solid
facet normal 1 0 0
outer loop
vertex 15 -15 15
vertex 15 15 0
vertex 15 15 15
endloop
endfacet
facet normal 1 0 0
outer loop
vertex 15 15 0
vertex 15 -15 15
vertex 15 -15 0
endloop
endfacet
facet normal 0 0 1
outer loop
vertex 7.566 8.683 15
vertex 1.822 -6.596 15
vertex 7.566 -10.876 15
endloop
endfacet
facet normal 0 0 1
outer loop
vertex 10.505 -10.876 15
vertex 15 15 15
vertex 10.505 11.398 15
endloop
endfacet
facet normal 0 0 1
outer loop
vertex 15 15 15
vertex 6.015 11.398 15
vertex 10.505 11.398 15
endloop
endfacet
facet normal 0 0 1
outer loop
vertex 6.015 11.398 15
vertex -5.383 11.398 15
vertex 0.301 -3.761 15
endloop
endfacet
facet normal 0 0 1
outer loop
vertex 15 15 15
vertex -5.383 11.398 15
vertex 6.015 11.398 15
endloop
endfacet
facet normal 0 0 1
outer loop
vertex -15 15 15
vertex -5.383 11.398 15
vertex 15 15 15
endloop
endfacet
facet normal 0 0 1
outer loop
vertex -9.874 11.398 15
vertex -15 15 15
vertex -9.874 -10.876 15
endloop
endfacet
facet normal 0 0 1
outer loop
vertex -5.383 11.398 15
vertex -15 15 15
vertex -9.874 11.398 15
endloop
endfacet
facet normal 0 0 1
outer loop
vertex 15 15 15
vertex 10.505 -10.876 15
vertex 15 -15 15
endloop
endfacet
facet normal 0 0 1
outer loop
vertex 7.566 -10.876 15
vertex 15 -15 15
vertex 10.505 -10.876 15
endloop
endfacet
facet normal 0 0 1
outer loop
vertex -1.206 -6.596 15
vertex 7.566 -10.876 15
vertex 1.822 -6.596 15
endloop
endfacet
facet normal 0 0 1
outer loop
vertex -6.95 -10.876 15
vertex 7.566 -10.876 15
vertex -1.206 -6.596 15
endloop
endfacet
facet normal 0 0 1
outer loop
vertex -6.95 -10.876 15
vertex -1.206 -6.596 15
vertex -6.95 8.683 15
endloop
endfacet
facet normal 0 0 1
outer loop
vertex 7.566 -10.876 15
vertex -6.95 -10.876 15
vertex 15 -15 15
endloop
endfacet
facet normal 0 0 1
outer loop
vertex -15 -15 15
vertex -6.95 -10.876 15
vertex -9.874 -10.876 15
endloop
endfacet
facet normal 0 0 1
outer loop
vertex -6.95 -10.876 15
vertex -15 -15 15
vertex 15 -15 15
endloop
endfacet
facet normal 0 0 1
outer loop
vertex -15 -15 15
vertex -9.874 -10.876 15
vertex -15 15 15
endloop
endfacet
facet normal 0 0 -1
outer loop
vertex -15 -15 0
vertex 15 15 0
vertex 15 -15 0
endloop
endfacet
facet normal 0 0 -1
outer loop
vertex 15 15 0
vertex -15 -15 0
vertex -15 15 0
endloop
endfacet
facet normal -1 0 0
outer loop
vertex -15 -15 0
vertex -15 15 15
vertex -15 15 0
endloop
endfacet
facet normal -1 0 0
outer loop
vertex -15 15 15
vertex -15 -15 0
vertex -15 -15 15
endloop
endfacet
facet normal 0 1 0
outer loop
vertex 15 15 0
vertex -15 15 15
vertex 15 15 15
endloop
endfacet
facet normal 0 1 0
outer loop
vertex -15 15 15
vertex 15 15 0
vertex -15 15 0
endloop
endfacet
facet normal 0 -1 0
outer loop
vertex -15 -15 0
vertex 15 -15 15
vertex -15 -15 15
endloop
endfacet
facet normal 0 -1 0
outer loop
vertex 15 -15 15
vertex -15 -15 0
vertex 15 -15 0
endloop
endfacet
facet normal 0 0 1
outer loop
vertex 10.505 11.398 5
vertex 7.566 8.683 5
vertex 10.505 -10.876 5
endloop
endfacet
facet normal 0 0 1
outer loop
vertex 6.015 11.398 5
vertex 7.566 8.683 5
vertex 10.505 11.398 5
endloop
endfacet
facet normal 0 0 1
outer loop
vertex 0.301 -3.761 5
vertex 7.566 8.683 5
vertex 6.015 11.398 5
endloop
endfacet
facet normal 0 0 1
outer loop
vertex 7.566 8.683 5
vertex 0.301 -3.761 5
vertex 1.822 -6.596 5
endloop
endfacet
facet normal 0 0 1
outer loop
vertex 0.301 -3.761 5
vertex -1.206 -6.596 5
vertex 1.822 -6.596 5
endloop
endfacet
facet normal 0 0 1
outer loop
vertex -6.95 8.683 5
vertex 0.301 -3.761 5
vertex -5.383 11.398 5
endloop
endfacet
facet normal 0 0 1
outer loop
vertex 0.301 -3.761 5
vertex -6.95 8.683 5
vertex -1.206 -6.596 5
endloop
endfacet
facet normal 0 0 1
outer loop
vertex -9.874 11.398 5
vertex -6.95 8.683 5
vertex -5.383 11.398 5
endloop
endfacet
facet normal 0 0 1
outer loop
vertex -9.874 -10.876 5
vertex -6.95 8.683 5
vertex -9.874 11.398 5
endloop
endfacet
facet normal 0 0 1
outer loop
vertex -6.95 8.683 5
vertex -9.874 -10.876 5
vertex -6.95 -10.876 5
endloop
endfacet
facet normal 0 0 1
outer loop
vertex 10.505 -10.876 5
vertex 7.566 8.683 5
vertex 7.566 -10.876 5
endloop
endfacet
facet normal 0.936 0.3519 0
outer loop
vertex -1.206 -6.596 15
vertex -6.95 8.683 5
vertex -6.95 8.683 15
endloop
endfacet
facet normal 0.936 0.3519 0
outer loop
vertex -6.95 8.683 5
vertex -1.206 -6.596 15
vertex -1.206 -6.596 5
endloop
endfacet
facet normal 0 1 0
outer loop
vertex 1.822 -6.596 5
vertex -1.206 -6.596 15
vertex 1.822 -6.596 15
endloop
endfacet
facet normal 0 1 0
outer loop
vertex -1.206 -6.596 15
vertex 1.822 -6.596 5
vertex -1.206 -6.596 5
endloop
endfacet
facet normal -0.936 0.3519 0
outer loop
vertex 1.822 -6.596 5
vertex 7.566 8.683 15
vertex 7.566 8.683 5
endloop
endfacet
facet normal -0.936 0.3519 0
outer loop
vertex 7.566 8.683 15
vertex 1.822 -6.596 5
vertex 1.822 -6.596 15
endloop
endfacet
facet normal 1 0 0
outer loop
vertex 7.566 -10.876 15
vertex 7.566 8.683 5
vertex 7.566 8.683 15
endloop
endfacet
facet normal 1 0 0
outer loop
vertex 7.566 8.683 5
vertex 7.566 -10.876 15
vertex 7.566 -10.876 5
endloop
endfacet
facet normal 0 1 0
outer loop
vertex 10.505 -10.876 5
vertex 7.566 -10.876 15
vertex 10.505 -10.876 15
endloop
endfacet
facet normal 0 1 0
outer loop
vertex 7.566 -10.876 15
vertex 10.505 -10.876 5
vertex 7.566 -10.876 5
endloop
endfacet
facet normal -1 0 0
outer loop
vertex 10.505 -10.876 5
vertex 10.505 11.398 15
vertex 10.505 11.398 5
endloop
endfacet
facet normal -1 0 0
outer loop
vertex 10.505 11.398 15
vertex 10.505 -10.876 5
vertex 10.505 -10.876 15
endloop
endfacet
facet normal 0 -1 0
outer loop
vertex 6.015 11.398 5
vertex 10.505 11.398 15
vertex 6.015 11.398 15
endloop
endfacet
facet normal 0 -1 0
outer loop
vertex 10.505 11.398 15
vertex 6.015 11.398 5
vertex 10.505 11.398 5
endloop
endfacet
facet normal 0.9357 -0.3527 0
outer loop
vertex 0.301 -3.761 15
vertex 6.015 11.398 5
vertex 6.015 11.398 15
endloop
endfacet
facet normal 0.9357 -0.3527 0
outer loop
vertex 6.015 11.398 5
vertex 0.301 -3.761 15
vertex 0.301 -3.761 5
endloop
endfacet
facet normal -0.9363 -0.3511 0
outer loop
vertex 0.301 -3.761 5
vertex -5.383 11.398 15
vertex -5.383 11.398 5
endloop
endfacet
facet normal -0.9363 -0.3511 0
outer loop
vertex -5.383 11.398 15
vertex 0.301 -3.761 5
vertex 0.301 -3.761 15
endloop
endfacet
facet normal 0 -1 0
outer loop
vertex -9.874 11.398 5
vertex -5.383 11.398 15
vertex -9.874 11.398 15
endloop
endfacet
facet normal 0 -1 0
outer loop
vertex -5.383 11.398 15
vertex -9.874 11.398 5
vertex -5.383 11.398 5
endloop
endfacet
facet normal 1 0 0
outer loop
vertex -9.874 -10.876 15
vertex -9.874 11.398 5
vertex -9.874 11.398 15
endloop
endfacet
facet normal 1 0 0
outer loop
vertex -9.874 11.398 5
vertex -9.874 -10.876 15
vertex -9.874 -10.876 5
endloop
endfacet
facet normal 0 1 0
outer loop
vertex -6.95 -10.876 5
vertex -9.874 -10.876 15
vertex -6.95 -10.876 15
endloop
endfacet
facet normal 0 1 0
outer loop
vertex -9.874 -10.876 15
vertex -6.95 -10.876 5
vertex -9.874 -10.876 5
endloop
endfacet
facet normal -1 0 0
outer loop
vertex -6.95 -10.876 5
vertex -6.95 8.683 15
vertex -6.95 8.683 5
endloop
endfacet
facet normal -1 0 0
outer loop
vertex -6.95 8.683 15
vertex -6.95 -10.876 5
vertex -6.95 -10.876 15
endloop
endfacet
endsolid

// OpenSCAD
// LetterBlock.scad - Basic usage of text() and linear_extrude()

// Module instantiation
LetterBlock("M");

// Module definition.
// size=30 defines an optional parameter with a default value.
module LetterBlock(letter, size=30) {
    difference() {
        translate([0,0,size/4]) cube([size,size,size/2], center=true);
        translate([0,0,size/6]) {
            // convexity is needed for correct preview
            // since characters can be highly concave
            linear_extrude(height=size, convexity=4)
                text(letter, 
                     size=size*22/30,
                     font="Bitstream Vera Sans",
                     halign="center",
                     valign="center");
        }
    }
}

echo(version=version());
// Written by Marius Kintel <marius@kintel.net>
//
// To the extent possible under law, the author(s) have dedicated all
// copyright and related and neighboring rights to this software to the
// public domain worldwide. This software is distributed without any
// warranty.
//
// You should have received a copy of the CC0 Public Domain
// Dedication along with this software.
// If not, see <http://creativecommons.org/publicdomain/zero/1.0/>.
